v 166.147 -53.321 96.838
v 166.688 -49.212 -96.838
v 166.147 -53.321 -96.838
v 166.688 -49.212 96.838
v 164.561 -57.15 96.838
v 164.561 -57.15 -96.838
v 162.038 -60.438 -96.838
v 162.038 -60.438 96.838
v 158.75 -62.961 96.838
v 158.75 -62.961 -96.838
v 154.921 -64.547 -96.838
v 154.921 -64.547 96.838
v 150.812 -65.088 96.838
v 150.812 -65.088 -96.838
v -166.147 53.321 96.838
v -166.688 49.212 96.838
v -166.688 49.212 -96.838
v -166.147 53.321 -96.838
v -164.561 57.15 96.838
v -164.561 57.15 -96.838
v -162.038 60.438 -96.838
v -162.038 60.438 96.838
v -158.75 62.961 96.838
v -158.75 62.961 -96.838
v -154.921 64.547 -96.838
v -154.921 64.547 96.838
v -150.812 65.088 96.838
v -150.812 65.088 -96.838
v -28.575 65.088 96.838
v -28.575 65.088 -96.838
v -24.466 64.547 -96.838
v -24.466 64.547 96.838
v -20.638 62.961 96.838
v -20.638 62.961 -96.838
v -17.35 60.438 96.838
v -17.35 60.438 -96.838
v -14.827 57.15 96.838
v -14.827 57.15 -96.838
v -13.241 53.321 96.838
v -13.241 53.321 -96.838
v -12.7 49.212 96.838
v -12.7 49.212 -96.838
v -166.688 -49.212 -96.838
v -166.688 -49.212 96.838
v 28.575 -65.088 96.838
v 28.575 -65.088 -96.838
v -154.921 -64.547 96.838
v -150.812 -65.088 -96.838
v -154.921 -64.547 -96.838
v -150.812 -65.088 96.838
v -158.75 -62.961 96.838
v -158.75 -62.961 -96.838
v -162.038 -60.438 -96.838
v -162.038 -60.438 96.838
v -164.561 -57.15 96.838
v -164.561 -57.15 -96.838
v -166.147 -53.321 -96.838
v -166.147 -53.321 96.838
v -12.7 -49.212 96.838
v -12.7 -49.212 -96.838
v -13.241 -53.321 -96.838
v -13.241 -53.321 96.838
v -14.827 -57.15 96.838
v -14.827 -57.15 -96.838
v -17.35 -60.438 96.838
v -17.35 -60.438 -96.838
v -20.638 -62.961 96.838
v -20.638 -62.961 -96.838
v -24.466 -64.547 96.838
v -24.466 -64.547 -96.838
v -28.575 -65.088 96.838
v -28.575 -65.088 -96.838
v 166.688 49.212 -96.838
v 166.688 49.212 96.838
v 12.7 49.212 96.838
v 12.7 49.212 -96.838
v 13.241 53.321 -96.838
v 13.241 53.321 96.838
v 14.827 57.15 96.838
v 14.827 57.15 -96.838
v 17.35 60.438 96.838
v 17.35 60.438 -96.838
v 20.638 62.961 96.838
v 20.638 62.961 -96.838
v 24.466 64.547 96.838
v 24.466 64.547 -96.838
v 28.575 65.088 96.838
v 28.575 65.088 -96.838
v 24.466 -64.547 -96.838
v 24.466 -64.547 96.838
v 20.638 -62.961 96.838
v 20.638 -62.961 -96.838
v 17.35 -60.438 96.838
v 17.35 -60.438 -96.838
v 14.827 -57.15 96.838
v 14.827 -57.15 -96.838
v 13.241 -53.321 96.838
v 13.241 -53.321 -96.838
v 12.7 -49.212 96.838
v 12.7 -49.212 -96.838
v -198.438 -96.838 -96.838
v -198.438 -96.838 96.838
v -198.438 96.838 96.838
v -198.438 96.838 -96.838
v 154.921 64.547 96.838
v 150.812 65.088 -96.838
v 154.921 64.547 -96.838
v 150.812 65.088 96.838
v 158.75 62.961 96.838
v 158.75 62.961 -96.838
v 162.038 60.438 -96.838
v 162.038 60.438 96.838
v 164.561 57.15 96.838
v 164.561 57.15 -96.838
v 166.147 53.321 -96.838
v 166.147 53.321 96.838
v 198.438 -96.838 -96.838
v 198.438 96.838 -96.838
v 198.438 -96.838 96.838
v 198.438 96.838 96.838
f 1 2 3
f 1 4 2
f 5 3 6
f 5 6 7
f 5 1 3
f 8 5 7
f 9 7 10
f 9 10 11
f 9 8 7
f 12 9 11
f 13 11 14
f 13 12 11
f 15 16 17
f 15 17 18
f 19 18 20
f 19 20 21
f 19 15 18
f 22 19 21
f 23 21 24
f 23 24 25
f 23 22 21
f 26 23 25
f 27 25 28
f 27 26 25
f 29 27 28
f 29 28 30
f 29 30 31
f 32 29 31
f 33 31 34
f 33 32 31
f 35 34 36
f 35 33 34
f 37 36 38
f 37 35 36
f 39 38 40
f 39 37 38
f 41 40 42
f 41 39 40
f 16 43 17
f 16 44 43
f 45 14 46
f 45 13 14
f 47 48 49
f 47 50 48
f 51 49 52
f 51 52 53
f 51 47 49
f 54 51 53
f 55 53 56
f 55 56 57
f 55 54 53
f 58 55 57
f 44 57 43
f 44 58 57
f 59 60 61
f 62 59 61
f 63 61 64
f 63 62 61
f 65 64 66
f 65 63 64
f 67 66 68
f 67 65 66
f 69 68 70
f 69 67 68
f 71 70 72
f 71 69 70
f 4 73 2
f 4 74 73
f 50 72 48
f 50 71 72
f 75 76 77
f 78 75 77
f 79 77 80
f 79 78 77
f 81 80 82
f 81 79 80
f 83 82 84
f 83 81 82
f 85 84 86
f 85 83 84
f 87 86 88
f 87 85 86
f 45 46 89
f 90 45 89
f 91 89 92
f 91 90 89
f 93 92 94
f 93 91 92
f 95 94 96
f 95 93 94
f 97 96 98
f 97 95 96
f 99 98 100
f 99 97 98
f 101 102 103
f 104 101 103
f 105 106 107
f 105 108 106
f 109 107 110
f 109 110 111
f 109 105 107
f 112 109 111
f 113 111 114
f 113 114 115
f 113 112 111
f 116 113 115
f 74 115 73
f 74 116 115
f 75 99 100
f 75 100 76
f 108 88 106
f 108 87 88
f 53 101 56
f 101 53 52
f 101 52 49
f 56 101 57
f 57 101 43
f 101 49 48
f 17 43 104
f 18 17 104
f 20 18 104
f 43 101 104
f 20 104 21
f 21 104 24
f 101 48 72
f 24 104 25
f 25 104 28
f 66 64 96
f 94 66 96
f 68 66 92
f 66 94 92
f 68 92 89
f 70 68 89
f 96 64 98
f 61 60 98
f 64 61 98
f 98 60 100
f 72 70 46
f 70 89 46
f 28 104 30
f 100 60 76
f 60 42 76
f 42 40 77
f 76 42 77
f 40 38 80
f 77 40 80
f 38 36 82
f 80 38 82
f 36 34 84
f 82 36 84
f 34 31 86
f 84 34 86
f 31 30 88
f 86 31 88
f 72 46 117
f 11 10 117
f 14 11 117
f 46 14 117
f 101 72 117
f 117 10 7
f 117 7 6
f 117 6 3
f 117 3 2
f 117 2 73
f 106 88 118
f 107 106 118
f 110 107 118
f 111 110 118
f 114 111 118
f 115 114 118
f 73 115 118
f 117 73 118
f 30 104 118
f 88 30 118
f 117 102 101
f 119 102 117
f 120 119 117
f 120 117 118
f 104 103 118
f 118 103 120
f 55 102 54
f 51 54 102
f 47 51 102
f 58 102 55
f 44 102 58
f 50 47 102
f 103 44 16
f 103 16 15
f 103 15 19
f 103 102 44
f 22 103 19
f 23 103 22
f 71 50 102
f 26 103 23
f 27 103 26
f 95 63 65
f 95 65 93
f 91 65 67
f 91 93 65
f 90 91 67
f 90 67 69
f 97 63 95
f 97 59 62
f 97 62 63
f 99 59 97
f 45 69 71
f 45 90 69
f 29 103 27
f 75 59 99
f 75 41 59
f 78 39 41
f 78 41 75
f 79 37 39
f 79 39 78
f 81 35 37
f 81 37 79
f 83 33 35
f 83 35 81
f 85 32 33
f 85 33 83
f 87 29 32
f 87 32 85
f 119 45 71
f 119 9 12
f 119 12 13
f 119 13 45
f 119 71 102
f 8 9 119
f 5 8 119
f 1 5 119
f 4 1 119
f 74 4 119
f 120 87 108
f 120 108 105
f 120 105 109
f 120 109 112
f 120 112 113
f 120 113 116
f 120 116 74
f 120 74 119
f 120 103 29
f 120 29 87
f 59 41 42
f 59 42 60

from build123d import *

# Parameters (mm, degrees)
F0_W     = 396.875
F0_H     = 193.675
F1_DEPTH = 96.8375


with BuildPart() as f1:
    # F0 (on Top) → F1 (new body, symmetric)
    with BuildSketch(Plane.XY):
        Rectangle(F0_W, F0_H)
        with BuildLine():
            ThreePointArc((-166.6875, 49.2125), (-162.03782, 60.43782), (-150.8125, 65.0875))
            Line((-150.8125, 65.0875), (-28.575, 65.0875))
            ThreePointArc((-28.575, 65.0875), (-17.34968, 60.43782), (-12.7, 49.2125))
            Line((-12.7, 49.2125), (-12.7, 0))
            Line((-12.7, 0), (-12.7, -49.2125))
            ThreePointArc((-12.7, -49.2125), (-17.34968, -60.43782), (-28.575, -65.0875))
            Line((-28.575, -65.0875), (-150.8125, -65.0875))
            ThreePointArc((-150.8125, -65.0875), (-162.03782, -60.43782), (-166.6875, -49.2125))
            Line((-166.6875, -49.2125), (-166.6875, 49.2125))
        make_face(mode=Mode.SUBTRACT)
        with BuildLine():
            Line((12.7, -49.2125), (12.7, 0))
            Line((12.7, 0), (12.7, 49.2125))
            ThreePointArc((12.7, 49.2125), (17.34968, 60.43782), (28.575, 65.0875))
            Line((28.575, 65.0875), (150.8125, 65.0875))
            ThreePointArc((150.8125, 65.0875), (162.03782, 60.43782), (166.6875, 49.2125))
            Line((166.6875, 49.2125), (166.6875, -49.2125))
            ThreePointArc((166.6875, -49.2125), (162.03782, -60.43782), (150.8125, -65.0875))
            Line((150.8125, -65.0875), (28.575, -65.0875))
            ThreePointArc((28.575, -65.0875), (17.34968, -60.43782), (12.7, -49.2125))
        make_face(mode=Mode.SUBTRACT)
    extrude(amount=F1_DEPTH, both=True)


solid = f1.part
